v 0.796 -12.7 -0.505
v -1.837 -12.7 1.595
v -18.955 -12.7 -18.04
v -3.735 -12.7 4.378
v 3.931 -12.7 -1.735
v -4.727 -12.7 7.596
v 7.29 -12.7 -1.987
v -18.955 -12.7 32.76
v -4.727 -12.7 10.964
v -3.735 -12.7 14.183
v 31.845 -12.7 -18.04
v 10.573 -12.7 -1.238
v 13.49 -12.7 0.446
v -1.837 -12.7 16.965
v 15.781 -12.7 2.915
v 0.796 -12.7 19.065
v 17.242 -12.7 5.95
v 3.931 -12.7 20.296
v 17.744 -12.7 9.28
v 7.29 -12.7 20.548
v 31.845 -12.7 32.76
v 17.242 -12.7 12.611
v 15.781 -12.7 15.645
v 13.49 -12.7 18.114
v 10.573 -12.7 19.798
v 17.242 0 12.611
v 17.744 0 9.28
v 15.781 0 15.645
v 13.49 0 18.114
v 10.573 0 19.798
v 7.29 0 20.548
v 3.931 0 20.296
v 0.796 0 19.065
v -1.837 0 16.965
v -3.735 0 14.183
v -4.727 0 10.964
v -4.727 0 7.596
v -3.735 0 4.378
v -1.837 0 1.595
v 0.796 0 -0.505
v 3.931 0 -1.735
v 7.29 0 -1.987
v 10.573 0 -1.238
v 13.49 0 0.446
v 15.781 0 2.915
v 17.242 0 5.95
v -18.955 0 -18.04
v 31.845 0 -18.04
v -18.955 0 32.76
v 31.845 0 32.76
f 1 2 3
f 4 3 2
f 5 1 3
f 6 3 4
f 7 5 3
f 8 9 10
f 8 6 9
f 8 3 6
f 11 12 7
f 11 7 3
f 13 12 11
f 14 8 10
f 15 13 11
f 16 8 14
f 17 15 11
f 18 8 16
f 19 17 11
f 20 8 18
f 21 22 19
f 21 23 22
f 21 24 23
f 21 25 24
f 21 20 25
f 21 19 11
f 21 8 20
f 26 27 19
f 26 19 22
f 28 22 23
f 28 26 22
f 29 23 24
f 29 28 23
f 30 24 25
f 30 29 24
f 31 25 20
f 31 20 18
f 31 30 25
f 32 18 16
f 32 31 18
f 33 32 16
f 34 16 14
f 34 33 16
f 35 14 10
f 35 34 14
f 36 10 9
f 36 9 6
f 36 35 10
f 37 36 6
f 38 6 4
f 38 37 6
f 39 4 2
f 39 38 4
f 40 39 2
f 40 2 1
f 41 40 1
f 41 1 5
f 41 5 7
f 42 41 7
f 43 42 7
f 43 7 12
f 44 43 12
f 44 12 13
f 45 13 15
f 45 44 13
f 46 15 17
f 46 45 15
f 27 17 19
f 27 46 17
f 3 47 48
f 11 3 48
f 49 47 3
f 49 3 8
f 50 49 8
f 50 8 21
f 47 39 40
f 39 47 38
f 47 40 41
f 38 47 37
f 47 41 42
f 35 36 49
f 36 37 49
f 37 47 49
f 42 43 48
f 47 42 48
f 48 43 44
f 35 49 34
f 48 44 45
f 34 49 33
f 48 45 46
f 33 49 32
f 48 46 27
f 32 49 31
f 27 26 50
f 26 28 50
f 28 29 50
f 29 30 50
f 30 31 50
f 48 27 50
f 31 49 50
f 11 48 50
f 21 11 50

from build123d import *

# Parameters (mm, degrees)
F0_W     = 50.8
F0_H     = 50.8
F0_R     = 11.298879
F1_DEPTH = 12.7
F2_DEPTH = 12.7


with BuildPart() as f1:
    # F0 (on Front) → F1 (new body)
    with BuildSketch(Plane.XZ):
        with Locations((6.445251, 7.359565)):
            Rectangle(F0_W, F0_H)
        with Locations((6.445251, 9.280269)):
            Circle(F0_R, mode=Mode.SUBTRACT)
    extrude(amount=F1_DEPTH)

    # F0 (on Front) → F2 (join)
    with BuildSketch(Plane.XZ):
        with Locations((6.445251, 7.359565)):
            Rectangle(F0_W, F0_H)
        with Locations((6.445251, 9.280269)):
            Circle(F0_R, mode=Mode.SUBTRACT)
    extrude(amount=F2_DEPTH)


solid = f1.part
